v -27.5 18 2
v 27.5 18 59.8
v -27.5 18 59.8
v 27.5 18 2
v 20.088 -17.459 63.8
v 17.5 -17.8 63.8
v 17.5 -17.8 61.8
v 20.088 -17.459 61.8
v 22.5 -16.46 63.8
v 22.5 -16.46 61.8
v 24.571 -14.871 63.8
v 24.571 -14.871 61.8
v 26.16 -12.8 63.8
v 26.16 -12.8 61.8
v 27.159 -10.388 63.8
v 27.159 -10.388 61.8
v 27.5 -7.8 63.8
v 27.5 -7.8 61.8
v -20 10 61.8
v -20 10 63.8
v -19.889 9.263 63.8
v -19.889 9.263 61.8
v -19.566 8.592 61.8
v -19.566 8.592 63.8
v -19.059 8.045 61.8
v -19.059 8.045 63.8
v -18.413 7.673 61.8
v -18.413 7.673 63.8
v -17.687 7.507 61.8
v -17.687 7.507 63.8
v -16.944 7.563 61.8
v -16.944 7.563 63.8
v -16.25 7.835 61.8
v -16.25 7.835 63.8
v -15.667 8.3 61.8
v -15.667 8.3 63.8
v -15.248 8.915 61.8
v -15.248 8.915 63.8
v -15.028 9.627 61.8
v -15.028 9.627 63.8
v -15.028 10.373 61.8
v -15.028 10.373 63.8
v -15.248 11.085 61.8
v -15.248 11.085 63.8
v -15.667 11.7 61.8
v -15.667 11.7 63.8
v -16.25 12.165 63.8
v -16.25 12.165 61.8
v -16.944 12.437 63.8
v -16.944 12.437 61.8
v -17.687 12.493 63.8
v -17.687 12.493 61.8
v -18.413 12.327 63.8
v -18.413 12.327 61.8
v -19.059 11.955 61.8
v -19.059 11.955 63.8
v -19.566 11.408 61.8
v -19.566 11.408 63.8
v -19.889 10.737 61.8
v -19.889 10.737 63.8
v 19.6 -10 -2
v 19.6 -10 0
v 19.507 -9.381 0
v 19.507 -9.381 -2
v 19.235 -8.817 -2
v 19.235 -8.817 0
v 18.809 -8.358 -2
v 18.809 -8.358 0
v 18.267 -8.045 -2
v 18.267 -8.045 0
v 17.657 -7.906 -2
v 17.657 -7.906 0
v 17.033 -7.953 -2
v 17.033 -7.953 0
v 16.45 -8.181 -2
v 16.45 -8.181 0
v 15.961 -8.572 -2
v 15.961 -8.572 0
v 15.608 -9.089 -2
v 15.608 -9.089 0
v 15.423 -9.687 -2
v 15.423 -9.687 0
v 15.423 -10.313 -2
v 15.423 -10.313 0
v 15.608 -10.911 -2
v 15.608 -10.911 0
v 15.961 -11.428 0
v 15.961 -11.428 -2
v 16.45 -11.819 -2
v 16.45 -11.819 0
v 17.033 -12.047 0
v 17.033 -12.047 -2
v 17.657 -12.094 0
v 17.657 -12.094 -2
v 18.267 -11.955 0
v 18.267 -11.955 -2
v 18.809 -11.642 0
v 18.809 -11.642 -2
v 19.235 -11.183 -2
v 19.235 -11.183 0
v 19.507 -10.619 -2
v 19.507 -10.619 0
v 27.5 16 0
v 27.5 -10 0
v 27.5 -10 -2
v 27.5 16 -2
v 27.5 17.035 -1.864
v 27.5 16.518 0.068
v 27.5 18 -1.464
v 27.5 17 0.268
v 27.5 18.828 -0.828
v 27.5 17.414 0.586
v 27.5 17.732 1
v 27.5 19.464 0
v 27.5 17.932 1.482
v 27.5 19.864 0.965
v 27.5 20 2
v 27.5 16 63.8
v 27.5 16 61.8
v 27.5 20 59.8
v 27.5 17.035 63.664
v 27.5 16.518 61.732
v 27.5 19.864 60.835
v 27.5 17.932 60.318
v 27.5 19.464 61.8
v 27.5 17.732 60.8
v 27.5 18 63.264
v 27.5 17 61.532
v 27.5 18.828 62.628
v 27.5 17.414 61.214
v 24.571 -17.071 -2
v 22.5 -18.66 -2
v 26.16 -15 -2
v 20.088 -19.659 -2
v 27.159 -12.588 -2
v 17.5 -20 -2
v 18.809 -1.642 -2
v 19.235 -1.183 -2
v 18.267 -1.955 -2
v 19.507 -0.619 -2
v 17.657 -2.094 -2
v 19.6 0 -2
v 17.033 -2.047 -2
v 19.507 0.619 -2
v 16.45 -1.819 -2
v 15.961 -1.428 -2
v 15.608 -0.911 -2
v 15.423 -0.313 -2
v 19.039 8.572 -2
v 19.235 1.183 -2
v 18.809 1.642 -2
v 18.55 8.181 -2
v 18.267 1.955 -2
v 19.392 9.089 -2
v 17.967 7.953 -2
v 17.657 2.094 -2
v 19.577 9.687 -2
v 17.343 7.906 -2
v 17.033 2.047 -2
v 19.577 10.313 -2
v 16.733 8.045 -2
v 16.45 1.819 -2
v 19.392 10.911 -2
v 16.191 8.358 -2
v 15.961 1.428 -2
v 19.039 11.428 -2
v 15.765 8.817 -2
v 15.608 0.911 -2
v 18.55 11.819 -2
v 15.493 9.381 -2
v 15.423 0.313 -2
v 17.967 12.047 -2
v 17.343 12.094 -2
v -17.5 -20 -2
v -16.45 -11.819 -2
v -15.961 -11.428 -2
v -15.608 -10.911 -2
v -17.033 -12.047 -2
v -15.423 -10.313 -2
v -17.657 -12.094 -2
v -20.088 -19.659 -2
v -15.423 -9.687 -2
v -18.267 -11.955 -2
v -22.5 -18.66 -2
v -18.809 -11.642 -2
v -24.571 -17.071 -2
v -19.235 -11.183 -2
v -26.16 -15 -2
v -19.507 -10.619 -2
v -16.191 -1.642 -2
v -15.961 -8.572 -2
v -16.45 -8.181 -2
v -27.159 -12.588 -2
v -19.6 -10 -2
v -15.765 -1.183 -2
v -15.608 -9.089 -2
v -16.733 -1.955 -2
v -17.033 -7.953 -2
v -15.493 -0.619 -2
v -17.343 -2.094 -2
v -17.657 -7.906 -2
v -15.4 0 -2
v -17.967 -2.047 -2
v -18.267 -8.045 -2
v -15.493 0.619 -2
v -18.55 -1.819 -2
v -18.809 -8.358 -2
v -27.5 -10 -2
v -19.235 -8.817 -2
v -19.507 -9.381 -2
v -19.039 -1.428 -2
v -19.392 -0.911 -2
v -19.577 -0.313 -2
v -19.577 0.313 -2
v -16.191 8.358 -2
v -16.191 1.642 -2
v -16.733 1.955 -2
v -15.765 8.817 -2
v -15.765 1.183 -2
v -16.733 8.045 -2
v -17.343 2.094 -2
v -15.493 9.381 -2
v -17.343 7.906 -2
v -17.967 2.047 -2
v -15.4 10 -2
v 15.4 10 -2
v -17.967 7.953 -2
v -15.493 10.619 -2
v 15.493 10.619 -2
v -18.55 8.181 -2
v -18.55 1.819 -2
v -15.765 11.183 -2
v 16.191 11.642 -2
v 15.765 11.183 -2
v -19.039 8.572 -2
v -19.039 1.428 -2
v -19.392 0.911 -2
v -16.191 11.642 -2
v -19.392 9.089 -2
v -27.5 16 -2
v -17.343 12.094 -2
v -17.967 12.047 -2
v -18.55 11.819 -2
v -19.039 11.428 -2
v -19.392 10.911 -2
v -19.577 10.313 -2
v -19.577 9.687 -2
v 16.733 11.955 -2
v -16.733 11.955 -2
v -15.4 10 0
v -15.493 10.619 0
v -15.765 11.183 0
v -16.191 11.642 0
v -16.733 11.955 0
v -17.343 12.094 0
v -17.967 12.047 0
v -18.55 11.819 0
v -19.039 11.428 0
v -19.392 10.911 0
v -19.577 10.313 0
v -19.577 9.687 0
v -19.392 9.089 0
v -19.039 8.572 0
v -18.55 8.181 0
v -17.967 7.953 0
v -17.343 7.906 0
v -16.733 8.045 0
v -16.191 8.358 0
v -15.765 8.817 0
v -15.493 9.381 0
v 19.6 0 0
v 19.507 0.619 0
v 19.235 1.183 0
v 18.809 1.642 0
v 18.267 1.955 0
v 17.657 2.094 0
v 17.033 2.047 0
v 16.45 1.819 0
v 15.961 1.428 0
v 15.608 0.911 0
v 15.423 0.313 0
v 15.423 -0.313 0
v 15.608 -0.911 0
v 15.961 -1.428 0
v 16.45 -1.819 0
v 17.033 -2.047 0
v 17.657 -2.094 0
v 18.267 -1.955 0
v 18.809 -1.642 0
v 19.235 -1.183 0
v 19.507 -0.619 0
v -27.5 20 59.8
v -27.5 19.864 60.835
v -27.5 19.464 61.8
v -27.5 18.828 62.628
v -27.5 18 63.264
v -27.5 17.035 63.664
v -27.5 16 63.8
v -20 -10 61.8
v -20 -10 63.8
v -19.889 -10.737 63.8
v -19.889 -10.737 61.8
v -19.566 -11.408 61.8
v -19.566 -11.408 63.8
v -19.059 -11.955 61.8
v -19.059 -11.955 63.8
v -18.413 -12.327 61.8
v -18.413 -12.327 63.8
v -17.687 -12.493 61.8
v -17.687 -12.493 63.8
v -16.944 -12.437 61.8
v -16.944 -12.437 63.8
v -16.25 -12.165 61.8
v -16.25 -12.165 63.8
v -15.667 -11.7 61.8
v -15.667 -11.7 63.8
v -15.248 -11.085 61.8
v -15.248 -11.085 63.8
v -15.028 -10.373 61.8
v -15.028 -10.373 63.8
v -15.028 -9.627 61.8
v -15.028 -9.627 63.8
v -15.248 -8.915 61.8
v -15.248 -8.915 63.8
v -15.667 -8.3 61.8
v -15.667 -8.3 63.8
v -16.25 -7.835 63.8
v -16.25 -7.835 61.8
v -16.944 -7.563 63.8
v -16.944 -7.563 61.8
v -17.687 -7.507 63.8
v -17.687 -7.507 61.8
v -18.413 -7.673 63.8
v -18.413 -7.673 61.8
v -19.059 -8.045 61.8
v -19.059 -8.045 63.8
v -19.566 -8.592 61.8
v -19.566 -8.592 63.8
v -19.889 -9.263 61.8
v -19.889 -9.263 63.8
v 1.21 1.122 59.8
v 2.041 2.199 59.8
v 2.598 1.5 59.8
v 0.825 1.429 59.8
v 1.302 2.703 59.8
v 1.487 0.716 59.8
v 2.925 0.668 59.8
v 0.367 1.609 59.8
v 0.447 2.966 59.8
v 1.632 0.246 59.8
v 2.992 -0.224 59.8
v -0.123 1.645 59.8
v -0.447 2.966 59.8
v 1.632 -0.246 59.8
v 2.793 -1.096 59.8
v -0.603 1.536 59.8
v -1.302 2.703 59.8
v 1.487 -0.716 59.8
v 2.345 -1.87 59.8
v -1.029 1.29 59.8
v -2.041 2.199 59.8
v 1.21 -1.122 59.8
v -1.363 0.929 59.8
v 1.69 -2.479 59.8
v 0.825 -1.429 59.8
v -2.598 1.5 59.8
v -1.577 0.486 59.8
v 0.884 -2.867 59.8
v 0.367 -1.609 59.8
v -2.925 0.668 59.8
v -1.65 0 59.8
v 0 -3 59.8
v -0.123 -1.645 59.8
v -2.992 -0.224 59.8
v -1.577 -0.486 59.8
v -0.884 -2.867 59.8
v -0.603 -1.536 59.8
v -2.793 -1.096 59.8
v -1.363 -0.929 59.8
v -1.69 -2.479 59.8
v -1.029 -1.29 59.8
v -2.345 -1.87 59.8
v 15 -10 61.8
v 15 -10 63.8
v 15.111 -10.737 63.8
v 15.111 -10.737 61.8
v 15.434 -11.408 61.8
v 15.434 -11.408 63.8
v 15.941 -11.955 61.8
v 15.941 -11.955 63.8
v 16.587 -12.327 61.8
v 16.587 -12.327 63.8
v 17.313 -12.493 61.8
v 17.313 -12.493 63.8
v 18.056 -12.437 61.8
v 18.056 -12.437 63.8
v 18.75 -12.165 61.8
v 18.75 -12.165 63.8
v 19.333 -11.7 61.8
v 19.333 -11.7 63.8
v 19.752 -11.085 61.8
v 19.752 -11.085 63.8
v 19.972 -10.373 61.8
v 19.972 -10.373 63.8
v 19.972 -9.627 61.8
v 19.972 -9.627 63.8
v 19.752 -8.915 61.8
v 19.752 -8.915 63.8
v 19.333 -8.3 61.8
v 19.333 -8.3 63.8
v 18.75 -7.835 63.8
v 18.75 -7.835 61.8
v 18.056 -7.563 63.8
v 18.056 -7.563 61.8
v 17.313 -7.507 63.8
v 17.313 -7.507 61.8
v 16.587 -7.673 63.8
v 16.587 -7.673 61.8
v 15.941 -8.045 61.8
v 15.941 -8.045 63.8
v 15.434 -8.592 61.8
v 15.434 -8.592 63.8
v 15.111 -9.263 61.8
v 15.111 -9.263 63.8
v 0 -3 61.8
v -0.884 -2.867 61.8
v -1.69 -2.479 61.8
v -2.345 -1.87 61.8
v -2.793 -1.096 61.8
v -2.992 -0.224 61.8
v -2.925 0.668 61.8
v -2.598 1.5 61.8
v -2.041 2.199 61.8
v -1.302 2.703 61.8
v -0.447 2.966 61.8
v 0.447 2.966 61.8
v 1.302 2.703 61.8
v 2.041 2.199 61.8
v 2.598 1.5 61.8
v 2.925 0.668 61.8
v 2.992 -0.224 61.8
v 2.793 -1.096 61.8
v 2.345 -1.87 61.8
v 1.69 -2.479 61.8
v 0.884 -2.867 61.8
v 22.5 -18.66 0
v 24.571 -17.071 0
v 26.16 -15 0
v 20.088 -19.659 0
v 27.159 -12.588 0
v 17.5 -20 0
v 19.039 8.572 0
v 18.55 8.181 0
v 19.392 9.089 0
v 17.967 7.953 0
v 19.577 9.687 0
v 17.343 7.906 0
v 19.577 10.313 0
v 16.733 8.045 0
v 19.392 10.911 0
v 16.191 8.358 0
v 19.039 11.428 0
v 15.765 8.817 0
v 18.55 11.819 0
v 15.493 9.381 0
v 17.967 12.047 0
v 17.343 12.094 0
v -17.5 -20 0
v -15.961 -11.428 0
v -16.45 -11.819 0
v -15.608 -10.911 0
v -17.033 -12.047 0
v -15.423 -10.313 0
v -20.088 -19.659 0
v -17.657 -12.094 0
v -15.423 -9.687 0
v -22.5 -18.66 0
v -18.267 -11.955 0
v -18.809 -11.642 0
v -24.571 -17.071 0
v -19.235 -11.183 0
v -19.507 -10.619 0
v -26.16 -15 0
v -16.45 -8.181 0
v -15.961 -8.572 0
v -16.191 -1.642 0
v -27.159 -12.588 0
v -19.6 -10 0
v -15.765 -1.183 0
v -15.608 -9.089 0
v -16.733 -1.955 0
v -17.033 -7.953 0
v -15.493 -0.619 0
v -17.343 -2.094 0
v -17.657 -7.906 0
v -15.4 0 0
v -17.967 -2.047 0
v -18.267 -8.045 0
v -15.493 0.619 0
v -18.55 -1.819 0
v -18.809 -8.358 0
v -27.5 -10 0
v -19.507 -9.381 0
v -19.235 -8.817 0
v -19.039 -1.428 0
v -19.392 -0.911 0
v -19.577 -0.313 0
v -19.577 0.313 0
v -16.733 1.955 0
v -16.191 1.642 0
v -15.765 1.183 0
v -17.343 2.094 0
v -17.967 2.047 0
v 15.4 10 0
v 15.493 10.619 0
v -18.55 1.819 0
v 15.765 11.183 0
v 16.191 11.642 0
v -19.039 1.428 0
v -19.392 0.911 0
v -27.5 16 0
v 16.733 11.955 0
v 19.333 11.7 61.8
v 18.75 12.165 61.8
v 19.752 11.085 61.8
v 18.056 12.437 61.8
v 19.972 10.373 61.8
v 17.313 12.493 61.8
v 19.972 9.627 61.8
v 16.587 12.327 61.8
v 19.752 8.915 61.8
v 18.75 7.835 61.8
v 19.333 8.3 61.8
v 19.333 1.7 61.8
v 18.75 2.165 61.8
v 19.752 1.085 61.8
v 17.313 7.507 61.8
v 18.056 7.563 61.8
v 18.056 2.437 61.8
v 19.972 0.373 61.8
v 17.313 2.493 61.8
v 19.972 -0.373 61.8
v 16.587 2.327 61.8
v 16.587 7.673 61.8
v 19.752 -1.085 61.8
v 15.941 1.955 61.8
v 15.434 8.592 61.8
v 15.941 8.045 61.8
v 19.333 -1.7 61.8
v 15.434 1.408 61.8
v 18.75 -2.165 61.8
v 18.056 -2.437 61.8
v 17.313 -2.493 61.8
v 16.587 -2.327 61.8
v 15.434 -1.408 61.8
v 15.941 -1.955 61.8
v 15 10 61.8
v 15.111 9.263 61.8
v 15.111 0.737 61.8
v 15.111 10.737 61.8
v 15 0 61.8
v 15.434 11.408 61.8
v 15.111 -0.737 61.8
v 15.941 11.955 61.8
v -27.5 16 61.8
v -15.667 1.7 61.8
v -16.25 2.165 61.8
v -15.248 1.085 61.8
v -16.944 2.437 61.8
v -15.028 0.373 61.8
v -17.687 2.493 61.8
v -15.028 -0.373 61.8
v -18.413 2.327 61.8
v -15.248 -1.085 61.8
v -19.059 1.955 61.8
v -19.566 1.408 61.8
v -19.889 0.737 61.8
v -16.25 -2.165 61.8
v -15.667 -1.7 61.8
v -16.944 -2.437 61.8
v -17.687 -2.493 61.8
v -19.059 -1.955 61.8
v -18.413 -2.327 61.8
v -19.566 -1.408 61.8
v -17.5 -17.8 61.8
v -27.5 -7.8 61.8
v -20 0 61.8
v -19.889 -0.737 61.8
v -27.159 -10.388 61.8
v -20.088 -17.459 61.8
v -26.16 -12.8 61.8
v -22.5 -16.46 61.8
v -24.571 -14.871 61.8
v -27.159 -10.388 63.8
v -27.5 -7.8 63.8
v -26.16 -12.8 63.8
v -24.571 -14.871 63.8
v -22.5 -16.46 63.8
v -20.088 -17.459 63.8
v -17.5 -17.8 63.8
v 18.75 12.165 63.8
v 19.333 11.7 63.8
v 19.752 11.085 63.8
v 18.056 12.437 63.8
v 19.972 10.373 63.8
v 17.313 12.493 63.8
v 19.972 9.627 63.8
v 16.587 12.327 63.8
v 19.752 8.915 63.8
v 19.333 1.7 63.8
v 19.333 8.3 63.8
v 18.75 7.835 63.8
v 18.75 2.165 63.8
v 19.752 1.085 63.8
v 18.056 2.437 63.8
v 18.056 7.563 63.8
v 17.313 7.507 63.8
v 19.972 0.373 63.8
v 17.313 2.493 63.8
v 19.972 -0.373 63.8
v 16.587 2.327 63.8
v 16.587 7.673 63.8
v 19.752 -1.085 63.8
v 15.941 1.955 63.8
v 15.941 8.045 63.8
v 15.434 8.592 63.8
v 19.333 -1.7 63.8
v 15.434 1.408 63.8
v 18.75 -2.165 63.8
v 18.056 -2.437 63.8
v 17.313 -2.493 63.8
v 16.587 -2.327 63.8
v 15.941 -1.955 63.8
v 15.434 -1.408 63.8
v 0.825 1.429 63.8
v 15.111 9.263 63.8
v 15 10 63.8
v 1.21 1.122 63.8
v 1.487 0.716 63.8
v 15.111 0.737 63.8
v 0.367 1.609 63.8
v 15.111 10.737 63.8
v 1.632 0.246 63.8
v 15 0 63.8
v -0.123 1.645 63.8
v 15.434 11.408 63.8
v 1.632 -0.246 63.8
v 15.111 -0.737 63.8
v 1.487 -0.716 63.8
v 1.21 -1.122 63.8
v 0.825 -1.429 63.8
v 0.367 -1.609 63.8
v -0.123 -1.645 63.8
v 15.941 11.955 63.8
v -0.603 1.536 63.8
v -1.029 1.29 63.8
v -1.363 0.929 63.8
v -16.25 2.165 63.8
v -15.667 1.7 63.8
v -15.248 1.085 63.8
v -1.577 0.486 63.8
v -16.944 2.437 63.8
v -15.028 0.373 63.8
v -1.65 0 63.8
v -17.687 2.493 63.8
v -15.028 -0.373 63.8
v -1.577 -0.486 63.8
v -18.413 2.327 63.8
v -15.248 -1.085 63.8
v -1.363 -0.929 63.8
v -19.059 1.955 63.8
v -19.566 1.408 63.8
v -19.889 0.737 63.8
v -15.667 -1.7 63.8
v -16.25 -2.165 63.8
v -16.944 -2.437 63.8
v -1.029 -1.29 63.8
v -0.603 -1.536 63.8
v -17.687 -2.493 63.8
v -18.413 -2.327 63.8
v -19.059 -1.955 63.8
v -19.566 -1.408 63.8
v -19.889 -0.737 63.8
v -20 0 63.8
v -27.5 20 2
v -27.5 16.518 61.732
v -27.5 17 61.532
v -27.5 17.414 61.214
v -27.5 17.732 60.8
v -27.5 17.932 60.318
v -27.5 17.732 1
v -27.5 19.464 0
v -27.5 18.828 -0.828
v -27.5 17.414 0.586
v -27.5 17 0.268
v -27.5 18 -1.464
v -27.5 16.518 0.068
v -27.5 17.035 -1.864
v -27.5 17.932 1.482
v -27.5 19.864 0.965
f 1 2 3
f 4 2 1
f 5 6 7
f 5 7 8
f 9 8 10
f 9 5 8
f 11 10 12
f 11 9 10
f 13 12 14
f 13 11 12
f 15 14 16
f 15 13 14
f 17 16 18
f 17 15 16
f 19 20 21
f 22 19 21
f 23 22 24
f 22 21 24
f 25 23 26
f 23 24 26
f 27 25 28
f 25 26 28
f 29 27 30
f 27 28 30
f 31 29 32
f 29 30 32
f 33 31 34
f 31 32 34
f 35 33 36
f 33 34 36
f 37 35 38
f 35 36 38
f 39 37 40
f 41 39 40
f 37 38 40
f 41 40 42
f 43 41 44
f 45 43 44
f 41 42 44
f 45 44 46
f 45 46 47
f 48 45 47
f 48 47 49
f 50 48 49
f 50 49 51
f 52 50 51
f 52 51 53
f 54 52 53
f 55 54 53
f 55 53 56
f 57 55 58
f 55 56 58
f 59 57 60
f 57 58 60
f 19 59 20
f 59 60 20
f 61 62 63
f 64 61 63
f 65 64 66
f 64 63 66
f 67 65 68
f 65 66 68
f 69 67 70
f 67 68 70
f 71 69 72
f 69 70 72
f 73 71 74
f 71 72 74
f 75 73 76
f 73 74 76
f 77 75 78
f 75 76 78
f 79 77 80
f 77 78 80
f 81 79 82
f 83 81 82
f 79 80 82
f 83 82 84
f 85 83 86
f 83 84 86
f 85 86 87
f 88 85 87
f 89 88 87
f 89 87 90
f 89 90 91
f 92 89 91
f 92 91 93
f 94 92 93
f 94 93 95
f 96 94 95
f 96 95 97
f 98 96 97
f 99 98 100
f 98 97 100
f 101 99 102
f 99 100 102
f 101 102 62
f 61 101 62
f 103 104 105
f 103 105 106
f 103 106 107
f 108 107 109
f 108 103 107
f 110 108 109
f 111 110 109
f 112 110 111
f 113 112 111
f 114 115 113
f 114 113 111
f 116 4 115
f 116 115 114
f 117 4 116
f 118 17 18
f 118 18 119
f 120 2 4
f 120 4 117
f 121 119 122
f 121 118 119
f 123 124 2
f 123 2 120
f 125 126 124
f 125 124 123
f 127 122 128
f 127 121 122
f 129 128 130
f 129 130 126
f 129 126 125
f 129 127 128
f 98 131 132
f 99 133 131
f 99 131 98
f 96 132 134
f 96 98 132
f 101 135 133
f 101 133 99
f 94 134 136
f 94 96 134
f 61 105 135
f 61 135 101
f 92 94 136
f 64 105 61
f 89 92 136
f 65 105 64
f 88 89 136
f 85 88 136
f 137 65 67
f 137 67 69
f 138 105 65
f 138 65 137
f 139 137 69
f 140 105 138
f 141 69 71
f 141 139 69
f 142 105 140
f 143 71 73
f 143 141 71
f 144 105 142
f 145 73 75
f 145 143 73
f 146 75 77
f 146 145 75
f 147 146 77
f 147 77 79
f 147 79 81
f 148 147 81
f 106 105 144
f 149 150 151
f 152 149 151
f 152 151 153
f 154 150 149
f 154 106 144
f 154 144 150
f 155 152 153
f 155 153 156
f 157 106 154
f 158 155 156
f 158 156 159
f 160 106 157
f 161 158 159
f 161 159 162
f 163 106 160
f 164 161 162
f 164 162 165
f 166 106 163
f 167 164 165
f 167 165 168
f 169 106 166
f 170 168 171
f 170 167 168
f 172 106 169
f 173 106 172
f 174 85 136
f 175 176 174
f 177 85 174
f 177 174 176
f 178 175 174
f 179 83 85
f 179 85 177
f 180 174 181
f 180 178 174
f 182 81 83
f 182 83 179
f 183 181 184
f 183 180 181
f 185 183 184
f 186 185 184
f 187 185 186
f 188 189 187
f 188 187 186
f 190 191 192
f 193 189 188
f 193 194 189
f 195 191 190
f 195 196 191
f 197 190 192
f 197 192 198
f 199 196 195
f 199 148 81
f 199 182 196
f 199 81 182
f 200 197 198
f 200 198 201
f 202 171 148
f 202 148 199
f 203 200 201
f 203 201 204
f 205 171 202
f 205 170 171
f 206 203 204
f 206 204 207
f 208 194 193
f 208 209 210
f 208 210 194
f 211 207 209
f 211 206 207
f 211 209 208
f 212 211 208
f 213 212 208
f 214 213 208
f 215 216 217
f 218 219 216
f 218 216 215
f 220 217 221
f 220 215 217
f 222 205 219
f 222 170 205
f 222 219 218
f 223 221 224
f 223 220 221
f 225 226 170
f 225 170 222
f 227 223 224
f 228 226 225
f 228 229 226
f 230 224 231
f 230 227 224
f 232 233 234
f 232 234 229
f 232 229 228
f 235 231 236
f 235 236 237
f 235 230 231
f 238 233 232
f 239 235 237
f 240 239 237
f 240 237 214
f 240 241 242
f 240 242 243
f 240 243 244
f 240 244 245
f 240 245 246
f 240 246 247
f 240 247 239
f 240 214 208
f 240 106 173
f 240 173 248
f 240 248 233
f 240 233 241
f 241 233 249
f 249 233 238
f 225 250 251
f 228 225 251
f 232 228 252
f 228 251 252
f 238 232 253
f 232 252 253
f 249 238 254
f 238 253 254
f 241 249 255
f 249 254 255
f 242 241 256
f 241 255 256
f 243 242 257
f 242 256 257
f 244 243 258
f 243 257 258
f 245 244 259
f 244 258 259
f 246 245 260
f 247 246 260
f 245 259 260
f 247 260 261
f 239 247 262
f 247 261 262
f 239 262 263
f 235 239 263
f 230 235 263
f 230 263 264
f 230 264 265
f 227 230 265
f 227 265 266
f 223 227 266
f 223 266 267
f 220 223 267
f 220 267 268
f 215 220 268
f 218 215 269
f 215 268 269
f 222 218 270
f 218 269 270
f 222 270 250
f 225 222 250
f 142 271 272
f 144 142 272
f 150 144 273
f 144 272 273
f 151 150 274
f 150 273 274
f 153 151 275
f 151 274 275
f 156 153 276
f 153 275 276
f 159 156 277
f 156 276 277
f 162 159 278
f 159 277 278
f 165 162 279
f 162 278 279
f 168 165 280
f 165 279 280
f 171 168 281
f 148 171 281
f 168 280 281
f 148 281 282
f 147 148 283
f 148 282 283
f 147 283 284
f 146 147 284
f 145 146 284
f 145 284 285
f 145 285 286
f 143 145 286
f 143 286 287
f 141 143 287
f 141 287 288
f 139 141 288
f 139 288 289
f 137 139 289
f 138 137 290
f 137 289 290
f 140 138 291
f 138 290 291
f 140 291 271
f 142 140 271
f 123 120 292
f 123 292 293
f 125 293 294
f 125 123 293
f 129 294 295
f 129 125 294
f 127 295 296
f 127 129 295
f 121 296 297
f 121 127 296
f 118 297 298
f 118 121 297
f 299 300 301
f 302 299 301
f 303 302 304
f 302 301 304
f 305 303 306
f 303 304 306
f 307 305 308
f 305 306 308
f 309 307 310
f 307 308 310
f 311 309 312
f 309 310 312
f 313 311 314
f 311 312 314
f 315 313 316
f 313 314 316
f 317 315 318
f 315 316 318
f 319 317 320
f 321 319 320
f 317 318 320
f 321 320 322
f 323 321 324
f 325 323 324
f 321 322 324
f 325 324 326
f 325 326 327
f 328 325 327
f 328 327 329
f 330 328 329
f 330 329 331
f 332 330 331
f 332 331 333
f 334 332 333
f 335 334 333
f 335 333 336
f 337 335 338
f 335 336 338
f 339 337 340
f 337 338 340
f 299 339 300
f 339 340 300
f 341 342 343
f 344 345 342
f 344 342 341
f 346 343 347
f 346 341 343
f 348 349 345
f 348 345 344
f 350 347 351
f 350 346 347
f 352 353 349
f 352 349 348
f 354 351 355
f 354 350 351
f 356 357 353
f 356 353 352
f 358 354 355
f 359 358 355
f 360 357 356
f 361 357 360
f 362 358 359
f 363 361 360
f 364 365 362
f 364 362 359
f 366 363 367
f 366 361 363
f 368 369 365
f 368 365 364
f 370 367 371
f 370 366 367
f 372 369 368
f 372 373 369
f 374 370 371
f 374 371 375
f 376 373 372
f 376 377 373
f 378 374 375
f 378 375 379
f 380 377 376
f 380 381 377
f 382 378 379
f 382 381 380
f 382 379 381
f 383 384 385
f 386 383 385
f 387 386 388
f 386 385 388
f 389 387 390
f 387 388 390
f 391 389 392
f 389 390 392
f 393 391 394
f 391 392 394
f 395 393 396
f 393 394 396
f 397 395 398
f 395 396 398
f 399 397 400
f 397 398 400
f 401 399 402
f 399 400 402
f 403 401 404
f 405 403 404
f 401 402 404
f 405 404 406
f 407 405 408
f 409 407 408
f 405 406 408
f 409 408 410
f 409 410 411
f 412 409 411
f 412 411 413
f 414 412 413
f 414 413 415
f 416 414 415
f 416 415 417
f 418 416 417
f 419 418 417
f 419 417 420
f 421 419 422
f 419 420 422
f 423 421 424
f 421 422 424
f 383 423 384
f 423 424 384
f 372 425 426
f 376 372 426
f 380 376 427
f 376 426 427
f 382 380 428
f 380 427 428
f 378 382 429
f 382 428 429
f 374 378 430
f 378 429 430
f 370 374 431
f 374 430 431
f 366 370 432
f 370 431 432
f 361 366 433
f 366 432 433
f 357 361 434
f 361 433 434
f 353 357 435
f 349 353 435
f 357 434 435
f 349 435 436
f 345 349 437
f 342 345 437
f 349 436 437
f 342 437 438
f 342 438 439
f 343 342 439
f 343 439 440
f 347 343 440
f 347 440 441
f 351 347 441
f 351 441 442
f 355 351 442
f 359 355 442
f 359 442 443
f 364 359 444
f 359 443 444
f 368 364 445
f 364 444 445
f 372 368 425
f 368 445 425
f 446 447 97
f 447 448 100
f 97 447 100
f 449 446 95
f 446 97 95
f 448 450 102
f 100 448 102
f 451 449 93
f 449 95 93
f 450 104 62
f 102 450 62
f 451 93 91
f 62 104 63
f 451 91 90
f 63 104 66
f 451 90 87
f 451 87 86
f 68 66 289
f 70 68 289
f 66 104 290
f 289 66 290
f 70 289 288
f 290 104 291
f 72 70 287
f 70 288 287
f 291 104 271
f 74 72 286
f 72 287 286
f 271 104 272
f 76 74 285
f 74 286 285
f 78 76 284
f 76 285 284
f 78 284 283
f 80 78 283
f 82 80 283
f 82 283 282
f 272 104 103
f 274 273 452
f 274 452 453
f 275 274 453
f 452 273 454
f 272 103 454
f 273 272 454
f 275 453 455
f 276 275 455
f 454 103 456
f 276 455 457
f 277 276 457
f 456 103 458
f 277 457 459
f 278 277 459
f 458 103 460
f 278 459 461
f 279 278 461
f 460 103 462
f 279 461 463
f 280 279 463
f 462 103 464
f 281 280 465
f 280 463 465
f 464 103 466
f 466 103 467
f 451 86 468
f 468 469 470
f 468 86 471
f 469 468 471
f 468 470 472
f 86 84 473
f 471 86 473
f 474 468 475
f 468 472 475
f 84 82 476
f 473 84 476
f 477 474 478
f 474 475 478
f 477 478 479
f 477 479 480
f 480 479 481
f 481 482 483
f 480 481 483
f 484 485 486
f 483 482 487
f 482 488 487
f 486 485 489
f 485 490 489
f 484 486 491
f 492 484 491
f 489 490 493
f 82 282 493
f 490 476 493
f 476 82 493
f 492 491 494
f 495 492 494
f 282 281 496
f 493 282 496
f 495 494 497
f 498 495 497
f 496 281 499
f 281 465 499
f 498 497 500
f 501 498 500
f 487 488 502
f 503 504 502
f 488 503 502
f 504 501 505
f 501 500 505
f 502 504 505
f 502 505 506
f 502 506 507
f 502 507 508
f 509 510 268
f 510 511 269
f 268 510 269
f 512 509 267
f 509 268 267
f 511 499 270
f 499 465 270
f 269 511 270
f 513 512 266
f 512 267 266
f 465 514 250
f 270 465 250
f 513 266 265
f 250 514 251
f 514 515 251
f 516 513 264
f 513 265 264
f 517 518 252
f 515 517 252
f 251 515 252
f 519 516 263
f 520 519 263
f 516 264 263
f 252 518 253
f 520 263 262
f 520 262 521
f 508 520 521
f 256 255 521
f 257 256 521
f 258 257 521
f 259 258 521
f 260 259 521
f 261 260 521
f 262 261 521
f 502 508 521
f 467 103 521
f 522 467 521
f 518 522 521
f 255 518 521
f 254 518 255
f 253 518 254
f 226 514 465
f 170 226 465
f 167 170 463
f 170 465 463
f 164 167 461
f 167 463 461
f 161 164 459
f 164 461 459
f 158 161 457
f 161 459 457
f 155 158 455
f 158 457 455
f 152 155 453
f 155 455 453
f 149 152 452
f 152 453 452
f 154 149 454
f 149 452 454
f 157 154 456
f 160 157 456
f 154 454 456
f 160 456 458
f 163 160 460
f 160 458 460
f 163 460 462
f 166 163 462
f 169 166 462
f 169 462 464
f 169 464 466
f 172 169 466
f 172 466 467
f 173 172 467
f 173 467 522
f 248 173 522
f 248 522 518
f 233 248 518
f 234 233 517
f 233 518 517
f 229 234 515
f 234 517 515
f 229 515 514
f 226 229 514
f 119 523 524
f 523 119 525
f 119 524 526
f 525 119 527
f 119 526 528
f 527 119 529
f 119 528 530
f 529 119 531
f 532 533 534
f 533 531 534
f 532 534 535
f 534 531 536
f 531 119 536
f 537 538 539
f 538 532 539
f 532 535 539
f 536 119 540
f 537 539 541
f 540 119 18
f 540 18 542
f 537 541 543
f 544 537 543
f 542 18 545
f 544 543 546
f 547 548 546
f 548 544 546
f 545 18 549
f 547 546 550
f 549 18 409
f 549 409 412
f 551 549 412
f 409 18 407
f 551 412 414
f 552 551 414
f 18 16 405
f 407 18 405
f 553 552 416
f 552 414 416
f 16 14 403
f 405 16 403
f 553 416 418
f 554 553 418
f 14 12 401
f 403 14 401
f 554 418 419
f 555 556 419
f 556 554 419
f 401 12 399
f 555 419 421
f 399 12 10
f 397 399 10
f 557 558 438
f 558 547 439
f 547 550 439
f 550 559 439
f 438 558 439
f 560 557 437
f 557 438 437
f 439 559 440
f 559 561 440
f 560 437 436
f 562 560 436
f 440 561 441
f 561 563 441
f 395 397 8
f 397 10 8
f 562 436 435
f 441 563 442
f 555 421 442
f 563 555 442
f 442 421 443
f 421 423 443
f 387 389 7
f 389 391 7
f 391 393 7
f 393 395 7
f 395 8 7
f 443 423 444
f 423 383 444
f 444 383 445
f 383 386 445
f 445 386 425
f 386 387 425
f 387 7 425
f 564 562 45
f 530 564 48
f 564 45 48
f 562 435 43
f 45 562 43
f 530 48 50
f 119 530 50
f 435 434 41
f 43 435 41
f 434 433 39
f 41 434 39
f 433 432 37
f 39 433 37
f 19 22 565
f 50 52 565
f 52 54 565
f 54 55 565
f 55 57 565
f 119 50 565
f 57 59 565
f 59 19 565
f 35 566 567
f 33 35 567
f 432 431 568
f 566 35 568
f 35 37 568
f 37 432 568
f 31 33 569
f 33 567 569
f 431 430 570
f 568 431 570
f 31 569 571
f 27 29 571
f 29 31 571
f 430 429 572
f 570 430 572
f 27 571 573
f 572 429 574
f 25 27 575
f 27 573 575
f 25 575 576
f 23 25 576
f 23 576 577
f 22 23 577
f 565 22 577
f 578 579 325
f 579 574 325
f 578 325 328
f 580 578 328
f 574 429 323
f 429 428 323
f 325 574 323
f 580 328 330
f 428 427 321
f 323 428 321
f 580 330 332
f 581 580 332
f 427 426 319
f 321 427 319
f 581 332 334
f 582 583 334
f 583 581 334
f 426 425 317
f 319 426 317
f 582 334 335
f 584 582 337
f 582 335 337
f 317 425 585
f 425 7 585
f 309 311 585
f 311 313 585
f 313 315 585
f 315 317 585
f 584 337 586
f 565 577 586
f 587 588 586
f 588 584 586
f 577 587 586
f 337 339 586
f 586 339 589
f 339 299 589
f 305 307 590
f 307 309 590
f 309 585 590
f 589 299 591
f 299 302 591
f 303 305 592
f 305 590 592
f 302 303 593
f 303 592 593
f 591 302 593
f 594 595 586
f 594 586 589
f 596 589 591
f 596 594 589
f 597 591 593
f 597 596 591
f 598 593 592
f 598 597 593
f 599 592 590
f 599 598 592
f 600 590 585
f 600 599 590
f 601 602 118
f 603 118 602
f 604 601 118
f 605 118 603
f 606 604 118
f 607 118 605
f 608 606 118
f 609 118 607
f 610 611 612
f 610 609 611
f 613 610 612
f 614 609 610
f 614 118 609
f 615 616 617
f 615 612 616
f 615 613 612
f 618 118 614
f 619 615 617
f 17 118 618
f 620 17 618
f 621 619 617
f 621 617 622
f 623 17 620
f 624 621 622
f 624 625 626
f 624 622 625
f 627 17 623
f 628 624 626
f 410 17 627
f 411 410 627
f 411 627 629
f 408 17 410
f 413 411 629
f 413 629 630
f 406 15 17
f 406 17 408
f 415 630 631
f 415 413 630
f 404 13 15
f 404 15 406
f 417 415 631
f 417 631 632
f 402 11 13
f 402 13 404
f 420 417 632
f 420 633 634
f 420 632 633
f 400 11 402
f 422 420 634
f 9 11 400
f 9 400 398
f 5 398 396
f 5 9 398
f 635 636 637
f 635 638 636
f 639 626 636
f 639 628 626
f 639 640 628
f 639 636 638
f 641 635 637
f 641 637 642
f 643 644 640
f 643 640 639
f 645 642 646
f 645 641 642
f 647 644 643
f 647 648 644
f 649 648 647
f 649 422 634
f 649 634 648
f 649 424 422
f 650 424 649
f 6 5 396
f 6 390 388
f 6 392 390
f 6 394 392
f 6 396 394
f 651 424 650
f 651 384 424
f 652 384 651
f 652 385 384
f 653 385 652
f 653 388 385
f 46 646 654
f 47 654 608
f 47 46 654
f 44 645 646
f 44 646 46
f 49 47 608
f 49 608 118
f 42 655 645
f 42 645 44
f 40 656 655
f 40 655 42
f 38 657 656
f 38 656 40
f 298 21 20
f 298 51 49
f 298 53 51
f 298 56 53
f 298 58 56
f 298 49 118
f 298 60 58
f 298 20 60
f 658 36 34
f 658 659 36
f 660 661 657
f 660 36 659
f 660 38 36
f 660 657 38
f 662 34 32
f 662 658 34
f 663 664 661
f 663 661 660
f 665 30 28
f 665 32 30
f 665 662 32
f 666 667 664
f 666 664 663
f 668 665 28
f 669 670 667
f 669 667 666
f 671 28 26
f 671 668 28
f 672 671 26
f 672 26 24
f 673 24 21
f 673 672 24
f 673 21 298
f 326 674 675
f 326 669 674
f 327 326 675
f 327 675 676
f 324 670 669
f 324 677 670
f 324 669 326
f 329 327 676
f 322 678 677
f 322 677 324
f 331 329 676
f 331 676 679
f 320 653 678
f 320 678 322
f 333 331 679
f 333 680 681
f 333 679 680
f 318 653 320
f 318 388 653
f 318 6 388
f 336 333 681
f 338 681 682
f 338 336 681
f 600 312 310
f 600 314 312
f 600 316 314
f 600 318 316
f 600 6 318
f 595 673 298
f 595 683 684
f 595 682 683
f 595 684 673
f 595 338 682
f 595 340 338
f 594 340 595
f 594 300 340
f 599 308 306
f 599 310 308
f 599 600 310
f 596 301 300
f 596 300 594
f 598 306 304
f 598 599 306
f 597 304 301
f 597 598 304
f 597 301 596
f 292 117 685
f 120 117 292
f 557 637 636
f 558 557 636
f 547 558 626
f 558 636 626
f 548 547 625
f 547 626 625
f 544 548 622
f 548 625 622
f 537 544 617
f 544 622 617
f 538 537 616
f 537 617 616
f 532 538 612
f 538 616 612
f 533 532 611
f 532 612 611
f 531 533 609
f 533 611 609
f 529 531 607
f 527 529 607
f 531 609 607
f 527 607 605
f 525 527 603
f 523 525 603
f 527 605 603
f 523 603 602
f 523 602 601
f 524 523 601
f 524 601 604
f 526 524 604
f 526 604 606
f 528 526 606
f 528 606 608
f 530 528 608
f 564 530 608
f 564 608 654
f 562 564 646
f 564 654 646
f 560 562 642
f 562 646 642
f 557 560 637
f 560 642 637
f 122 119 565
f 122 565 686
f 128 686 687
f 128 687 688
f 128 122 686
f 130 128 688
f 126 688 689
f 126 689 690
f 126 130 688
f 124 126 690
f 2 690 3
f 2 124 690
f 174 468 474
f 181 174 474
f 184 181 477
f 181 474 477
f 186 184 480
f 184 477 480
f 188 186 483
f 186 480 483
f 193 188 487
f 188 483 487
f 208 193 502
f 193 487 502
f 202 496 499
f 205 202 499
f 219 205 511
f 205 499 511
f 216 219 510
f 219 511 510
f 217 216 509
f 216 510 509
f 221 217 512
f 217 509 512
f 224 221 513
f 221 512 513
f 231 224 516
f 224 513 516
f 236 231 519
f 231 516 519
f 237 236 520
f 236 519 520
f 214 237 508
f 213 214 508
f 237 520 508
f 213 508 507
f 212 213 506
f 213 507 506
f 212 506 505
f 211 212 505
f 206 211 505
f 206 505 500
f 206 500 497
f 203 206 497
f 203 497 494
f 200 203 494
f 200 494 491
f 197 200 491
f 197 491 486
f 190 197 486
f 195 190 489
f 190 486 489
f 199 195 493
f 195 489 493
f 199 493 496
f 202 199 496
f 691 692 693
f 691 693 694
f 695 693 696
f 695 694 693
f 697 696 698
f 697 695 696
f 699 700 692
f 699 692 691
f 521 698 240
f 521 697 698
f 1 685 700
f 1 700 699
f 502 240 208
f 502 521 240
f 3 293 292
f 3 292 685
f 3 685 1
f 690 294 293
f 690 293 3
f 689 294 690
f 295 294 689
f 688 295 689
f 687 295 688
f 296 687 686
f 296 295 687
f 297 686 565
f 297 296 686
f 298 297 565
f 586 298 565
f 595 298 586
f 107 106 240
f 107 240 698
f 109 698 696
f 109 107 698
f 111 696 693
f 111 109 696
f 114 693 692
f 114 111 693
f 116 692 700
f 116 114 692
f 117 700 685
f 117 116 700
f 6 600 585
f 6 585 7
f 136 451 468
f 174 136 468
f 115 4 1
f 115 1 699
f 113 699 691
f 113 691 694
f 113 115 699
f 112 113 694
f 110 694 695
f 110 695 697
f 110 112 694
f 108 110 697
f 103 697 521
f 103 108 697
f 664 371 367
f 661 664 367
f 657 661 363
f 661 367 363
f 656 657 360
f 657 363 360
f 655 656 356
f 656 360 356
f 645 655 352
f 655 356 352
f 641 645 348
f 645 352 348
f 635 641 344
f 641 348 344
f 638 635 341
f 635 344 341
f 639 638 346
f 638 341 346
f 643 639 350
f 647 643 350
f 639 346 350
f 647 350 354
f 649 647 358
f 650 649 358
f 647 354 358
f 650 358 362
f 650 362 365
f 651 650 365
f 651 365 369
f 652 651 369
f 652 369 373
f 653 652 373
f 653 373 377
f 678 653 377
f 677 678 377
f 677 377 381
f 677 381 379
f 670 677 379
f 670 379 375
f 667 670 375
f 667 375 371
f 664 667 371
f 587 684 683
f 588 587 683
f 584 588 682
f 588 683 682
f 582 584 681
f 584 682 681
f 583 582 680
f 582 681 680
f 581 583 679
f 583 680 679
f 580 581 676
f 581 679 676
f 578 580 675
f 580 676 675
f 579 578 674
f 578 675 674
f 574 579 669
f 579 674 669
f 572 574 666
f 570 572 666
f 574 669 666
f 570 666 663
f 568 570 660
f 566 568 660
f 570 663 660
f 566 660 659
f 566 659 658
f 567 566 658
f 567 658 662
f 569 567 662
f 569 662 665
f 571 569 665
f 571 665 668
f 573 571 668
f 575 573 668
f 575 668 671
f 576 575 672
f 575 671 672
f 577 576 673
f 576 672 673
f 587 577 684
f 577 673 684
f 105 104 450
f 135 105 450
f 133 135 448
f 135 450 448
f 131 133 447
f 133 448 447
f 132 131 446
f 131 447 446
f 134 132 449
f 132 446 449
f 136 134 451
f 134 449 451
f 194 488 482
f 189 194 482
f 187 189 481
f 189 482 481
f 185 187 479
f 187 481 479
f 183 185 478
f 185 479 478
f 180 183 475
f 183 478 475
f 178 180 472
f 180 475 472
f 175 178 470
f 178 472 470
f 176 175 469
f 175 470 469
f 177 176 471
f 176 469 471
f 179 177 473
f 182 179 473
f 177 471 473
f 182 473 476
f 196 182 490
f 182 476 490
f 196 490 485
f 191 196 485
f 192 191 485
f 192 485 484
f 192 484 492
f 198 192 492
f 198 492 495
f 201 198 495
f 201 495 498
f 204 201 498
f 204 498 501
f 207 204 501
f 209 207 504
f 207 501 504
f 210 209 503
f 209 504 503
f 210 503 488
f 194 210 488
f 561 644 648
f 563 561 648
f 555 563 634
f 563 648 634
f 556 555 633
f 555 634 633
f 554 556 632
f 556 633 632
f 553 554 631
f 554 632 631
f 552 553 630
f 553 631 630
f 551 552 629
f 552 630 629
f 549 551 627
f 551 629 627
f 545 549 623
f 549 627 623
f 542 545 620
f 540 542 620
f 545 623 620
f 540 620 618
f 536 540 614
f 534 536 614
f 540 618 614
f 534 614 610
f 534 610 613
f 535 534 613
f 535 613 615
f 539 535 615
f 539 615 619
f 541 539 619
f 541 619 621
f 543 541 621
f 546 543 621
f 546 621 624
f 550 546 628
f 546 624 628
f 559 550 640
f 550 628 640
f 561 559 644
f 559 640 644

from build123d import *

# Parameters (mm, degrees)
SKETCH_1_R                       = 2.1
SM_BASE_FLANGE_1_DEPTH           = 2
SM_EDGE_FLANGE_1_STRIP_W         = 12
SM_EDGE_FLANGE_1_STRIP_H         = 2
SM_EDGE_FLANGE_1_STRIP_CUT_DEPTH = 55
SM_EDGE_FLANGE_1_DEPTH           = 55
SM_EDGE_FLANGE_2_STRIP_W         = 12
SM_EDGE_FLANGE_2_STRIP_H         = 2
SM_EDGE_FLANGE_2_STRIP_CUT_DEPTH = 55
SM_EDGE_FLANGE_2_DEPTH           = 55
SM_EDGE_FLANGE_2_PROFILE_R       = 2.5
SM_EDGE_FLANGE_2_FLAT_DEPTH      = 2
SKETCH_12_R                      = 3
EXTRUDE_1_DEPTH                  = 2
HOLE_WIZARD_M4_1_D               = 3.3
HOLE_WIZARD_M4_1_DEPTH           = 6
HOLE_WIZARD_M4_1_TIP             = 0.991420021


# Sheet-metal steps are written as plain solids
with BuildPart() as part:
    # Sketch 1 → 基体-法兰1 (new body)
    with BuildSketch(Plane.XY):
        with BuildLine():
            Line((-27.5, 20), (27.5, 20))
            Line((27.5, 20), (27.5, -10))
            ThreePointArc((27.5, -10), (24.571067812, -17.071067812), (17.5, -20))
            Line((17.5, -20), (-17.5, -20))
            ThreePointArc((-17.5, -20), (-24.571067812, -17.071067812), (-27.5, -10))
            Line((-27.5, -10), (-27.5, 20))
        make_face()
        with Locations((-17.5, 10)):
            Circle(SKETCH_1_R, mode=Mode.SUBTRACT)
        with Locations(Location((17.5, 10, 0), (0, 0, 180))):
            Circle(SKETCH_1_R, mode=Mode.SUBTRACT)
        with Locations((17.5, -10)):
            Circle(SKETCH_1_R, mode=Mode.SUBTRACT)
        with Locations(Location((-17.5, -10, 0), (0, 0, 180))):
            Circle(SKETCH_1_R, mode=Mode.SUBTRACT)
        with Locations((-17.5, 0)):
            Circle(SKETCH_1_R, mode=Mode.SUBTRACT)
        with Locations((17.5, 0)):
            Circle(SKETCH_1_R, mode=Mode.SUBTRACT)
    extrude(amount=-SM_BASE_FLANGE_1_DEPTH)

    # 边线-法兰1 strip (across the edge) → 边线-法兰1 strip cut (cut)
    with BuildSketch(Plane(origin=(27.5, 20, 0), x_dir=(0, -1, 0), z_dir=(-1, 0, 0))):
        with Locations((-2, -1)):
            Rectangle(SM_EDGE_FLANGE_1_STRIP_W, SM_EDGE_FLANGE_1_STRIP_H)
    extrude(amount=SM_EDGE_FLANGE_1_STRIP_CUT_DEPTH, mode=Mode.SUBTRACT)

    # 边线-法兰1 section (across the edge) → 边线-法兰1 (add)
    with BuildSketch(Plane(origin=(27.5, 20, 0), x_dir=(0, -1, 0), z_dir=(-1, 0, 0))):
        with BuildLine():
            Line((0, 2), (0, 63.8))
            Line((0, 63.8), (2, 63.8))
            Line((2, 63.8), (2, 2))
            ThreePointArc((2, 2), (2.585786438, 0.585786438), (4, 0))
            Line((4, 0), (4, -2))
            ThreePointArc((4, -2), (1.171572875, -0.828427125), (0, 2))
        make_face()
    extrude(amount=SM_EDGE_FLANGE_1_DEPTH)

    # 边线-法兰2 strip (across the edge) → 边线-法兰2 strip cut (cut)
    with BuildSketch(Plane(origin=(27.5, 18, 63.8), x_dir=(0, 0, -1), z_dir=(-1, 0, 0))):
        with Locations((-2, -1)):
            Rectangle(SM_EDGE_FLANGE_2_STRIP_W, SM_EDGE_FLANGE_2_STRIP_H)
    extrude(amount=SM_EDGE_FLANGE_2_STRIP_CUT_DEPTH, mode=Mode.SUBTRACT)

    # 边线-法兰2 bend section (across the edge) → 边线-法兰2 (add)
    with BuildSketch(Plane(origin=(27.5, 18, 63.8), x_dir=(0, 0, -1), z_dir=(-1, 0, 0))):
        with BuildLine():
            Line((0, 2), (2, 2))
            ThreePointArc((2, 2), (2.585786438, 0.585786438), (4, 0))
            Line((4, 0), (4, -2))
            ThreePointArc((4, -2), (1.171572875, -0.828427125), (0, 2))
        make_face()
    extrude(amount=SM_EDGE_FLANGE_2_DEPTH)

    # 边线-法兰2 profile (on flange) → 边线-法兰2 flat (add)
    with BuildSketch(Plane(origin=(0, 18, 63.8), x_dir=(-1, 0, 0), z_dir=(0, 0, 1))):
        with BuildLine():
            Line((-27.5, 2), (27.5, 2))
            Line((27.5, 2), (27.5, 25.8))
            ThreePointArc((27.5, 25.8), (24.571067812, 32.871067812), (17.5, 35.8))
            Line((17.5, 35.8), (-17.5, 35.8))
            ThreePointArc((-17.5, 35.8), (-24.571067812, 32.871067812), (-27.5, 25.8))
            Line((-27.5, 25.8), (-27.5, 2))
        make_face()
        with Locations((17.5, 8)):
            Circle(SM_EDGE_FLANGE_2_PROFILE_R, mode=Mode.SUBTRACT)
        with Locations((17.5, 18)):
            Circle(SM_EDGE_FLANGE_2_PROFILE_R, mode=Mode.SUBTRACT)
        with Locations((-17.5, 8)):
            Circle(SM_EDGE_FLANGE_2_PROFILE_R, mode=Mode.SUBTRACT)
        with Locations((-17.5, 18)):
            Circle(SM_EDGE_FLANGE_2_PROFILE_R, mode=Mode.SUBTRACT)
        with Locations((17.5, 28)):
            Circle(SM_EDGE_FLANGE_2_PROFILE_R, mode=Mode.SUBTRACT)
        with Locations((-17.5, 28)):
            Circle(SM_EDGE_FLANGE_2_PROFILE_R, mode=Mode.SUBTRACT)
    extrude(amount=-SM_EDGE_FLANGE_2_FLAT_DEPTH)

    # 草图12 → 凸台-拉伸1 (add)
    with BuildSketch(Plane(origin=(0, 0, 61.8), x_dir=(-1, 0, 0), z_dir=(0, 0, -1))):
        with Locations(Location((0, 0, 0), (0, 0, 270))):
            Circle(SKETCH_12_R)
    extrude(amount=EXTRUDE_1_DEPTH)

    # M4 螺纹孔1
    with Locations(Plane.XY.offset(63.8)):
        with Locations((0, 0)):
            Hole(HOLE_WIZARD_M4_1_D / 2, depth=HOLE_WIZARD_M4_1_DEPTH)
            with Locations((0, 0, -(HOLE_WIZARD_M4_1_DEPTH + HOLE_WIZARD_M4_1_TIP / 2))):  # 118° drill point
                Cone(0, HOLE_WIZARD_M4_1_D / 2, HOLE_WIZARD_M4_1_TIP, mode=Mode.SUBTRACT)


solid = part.part
